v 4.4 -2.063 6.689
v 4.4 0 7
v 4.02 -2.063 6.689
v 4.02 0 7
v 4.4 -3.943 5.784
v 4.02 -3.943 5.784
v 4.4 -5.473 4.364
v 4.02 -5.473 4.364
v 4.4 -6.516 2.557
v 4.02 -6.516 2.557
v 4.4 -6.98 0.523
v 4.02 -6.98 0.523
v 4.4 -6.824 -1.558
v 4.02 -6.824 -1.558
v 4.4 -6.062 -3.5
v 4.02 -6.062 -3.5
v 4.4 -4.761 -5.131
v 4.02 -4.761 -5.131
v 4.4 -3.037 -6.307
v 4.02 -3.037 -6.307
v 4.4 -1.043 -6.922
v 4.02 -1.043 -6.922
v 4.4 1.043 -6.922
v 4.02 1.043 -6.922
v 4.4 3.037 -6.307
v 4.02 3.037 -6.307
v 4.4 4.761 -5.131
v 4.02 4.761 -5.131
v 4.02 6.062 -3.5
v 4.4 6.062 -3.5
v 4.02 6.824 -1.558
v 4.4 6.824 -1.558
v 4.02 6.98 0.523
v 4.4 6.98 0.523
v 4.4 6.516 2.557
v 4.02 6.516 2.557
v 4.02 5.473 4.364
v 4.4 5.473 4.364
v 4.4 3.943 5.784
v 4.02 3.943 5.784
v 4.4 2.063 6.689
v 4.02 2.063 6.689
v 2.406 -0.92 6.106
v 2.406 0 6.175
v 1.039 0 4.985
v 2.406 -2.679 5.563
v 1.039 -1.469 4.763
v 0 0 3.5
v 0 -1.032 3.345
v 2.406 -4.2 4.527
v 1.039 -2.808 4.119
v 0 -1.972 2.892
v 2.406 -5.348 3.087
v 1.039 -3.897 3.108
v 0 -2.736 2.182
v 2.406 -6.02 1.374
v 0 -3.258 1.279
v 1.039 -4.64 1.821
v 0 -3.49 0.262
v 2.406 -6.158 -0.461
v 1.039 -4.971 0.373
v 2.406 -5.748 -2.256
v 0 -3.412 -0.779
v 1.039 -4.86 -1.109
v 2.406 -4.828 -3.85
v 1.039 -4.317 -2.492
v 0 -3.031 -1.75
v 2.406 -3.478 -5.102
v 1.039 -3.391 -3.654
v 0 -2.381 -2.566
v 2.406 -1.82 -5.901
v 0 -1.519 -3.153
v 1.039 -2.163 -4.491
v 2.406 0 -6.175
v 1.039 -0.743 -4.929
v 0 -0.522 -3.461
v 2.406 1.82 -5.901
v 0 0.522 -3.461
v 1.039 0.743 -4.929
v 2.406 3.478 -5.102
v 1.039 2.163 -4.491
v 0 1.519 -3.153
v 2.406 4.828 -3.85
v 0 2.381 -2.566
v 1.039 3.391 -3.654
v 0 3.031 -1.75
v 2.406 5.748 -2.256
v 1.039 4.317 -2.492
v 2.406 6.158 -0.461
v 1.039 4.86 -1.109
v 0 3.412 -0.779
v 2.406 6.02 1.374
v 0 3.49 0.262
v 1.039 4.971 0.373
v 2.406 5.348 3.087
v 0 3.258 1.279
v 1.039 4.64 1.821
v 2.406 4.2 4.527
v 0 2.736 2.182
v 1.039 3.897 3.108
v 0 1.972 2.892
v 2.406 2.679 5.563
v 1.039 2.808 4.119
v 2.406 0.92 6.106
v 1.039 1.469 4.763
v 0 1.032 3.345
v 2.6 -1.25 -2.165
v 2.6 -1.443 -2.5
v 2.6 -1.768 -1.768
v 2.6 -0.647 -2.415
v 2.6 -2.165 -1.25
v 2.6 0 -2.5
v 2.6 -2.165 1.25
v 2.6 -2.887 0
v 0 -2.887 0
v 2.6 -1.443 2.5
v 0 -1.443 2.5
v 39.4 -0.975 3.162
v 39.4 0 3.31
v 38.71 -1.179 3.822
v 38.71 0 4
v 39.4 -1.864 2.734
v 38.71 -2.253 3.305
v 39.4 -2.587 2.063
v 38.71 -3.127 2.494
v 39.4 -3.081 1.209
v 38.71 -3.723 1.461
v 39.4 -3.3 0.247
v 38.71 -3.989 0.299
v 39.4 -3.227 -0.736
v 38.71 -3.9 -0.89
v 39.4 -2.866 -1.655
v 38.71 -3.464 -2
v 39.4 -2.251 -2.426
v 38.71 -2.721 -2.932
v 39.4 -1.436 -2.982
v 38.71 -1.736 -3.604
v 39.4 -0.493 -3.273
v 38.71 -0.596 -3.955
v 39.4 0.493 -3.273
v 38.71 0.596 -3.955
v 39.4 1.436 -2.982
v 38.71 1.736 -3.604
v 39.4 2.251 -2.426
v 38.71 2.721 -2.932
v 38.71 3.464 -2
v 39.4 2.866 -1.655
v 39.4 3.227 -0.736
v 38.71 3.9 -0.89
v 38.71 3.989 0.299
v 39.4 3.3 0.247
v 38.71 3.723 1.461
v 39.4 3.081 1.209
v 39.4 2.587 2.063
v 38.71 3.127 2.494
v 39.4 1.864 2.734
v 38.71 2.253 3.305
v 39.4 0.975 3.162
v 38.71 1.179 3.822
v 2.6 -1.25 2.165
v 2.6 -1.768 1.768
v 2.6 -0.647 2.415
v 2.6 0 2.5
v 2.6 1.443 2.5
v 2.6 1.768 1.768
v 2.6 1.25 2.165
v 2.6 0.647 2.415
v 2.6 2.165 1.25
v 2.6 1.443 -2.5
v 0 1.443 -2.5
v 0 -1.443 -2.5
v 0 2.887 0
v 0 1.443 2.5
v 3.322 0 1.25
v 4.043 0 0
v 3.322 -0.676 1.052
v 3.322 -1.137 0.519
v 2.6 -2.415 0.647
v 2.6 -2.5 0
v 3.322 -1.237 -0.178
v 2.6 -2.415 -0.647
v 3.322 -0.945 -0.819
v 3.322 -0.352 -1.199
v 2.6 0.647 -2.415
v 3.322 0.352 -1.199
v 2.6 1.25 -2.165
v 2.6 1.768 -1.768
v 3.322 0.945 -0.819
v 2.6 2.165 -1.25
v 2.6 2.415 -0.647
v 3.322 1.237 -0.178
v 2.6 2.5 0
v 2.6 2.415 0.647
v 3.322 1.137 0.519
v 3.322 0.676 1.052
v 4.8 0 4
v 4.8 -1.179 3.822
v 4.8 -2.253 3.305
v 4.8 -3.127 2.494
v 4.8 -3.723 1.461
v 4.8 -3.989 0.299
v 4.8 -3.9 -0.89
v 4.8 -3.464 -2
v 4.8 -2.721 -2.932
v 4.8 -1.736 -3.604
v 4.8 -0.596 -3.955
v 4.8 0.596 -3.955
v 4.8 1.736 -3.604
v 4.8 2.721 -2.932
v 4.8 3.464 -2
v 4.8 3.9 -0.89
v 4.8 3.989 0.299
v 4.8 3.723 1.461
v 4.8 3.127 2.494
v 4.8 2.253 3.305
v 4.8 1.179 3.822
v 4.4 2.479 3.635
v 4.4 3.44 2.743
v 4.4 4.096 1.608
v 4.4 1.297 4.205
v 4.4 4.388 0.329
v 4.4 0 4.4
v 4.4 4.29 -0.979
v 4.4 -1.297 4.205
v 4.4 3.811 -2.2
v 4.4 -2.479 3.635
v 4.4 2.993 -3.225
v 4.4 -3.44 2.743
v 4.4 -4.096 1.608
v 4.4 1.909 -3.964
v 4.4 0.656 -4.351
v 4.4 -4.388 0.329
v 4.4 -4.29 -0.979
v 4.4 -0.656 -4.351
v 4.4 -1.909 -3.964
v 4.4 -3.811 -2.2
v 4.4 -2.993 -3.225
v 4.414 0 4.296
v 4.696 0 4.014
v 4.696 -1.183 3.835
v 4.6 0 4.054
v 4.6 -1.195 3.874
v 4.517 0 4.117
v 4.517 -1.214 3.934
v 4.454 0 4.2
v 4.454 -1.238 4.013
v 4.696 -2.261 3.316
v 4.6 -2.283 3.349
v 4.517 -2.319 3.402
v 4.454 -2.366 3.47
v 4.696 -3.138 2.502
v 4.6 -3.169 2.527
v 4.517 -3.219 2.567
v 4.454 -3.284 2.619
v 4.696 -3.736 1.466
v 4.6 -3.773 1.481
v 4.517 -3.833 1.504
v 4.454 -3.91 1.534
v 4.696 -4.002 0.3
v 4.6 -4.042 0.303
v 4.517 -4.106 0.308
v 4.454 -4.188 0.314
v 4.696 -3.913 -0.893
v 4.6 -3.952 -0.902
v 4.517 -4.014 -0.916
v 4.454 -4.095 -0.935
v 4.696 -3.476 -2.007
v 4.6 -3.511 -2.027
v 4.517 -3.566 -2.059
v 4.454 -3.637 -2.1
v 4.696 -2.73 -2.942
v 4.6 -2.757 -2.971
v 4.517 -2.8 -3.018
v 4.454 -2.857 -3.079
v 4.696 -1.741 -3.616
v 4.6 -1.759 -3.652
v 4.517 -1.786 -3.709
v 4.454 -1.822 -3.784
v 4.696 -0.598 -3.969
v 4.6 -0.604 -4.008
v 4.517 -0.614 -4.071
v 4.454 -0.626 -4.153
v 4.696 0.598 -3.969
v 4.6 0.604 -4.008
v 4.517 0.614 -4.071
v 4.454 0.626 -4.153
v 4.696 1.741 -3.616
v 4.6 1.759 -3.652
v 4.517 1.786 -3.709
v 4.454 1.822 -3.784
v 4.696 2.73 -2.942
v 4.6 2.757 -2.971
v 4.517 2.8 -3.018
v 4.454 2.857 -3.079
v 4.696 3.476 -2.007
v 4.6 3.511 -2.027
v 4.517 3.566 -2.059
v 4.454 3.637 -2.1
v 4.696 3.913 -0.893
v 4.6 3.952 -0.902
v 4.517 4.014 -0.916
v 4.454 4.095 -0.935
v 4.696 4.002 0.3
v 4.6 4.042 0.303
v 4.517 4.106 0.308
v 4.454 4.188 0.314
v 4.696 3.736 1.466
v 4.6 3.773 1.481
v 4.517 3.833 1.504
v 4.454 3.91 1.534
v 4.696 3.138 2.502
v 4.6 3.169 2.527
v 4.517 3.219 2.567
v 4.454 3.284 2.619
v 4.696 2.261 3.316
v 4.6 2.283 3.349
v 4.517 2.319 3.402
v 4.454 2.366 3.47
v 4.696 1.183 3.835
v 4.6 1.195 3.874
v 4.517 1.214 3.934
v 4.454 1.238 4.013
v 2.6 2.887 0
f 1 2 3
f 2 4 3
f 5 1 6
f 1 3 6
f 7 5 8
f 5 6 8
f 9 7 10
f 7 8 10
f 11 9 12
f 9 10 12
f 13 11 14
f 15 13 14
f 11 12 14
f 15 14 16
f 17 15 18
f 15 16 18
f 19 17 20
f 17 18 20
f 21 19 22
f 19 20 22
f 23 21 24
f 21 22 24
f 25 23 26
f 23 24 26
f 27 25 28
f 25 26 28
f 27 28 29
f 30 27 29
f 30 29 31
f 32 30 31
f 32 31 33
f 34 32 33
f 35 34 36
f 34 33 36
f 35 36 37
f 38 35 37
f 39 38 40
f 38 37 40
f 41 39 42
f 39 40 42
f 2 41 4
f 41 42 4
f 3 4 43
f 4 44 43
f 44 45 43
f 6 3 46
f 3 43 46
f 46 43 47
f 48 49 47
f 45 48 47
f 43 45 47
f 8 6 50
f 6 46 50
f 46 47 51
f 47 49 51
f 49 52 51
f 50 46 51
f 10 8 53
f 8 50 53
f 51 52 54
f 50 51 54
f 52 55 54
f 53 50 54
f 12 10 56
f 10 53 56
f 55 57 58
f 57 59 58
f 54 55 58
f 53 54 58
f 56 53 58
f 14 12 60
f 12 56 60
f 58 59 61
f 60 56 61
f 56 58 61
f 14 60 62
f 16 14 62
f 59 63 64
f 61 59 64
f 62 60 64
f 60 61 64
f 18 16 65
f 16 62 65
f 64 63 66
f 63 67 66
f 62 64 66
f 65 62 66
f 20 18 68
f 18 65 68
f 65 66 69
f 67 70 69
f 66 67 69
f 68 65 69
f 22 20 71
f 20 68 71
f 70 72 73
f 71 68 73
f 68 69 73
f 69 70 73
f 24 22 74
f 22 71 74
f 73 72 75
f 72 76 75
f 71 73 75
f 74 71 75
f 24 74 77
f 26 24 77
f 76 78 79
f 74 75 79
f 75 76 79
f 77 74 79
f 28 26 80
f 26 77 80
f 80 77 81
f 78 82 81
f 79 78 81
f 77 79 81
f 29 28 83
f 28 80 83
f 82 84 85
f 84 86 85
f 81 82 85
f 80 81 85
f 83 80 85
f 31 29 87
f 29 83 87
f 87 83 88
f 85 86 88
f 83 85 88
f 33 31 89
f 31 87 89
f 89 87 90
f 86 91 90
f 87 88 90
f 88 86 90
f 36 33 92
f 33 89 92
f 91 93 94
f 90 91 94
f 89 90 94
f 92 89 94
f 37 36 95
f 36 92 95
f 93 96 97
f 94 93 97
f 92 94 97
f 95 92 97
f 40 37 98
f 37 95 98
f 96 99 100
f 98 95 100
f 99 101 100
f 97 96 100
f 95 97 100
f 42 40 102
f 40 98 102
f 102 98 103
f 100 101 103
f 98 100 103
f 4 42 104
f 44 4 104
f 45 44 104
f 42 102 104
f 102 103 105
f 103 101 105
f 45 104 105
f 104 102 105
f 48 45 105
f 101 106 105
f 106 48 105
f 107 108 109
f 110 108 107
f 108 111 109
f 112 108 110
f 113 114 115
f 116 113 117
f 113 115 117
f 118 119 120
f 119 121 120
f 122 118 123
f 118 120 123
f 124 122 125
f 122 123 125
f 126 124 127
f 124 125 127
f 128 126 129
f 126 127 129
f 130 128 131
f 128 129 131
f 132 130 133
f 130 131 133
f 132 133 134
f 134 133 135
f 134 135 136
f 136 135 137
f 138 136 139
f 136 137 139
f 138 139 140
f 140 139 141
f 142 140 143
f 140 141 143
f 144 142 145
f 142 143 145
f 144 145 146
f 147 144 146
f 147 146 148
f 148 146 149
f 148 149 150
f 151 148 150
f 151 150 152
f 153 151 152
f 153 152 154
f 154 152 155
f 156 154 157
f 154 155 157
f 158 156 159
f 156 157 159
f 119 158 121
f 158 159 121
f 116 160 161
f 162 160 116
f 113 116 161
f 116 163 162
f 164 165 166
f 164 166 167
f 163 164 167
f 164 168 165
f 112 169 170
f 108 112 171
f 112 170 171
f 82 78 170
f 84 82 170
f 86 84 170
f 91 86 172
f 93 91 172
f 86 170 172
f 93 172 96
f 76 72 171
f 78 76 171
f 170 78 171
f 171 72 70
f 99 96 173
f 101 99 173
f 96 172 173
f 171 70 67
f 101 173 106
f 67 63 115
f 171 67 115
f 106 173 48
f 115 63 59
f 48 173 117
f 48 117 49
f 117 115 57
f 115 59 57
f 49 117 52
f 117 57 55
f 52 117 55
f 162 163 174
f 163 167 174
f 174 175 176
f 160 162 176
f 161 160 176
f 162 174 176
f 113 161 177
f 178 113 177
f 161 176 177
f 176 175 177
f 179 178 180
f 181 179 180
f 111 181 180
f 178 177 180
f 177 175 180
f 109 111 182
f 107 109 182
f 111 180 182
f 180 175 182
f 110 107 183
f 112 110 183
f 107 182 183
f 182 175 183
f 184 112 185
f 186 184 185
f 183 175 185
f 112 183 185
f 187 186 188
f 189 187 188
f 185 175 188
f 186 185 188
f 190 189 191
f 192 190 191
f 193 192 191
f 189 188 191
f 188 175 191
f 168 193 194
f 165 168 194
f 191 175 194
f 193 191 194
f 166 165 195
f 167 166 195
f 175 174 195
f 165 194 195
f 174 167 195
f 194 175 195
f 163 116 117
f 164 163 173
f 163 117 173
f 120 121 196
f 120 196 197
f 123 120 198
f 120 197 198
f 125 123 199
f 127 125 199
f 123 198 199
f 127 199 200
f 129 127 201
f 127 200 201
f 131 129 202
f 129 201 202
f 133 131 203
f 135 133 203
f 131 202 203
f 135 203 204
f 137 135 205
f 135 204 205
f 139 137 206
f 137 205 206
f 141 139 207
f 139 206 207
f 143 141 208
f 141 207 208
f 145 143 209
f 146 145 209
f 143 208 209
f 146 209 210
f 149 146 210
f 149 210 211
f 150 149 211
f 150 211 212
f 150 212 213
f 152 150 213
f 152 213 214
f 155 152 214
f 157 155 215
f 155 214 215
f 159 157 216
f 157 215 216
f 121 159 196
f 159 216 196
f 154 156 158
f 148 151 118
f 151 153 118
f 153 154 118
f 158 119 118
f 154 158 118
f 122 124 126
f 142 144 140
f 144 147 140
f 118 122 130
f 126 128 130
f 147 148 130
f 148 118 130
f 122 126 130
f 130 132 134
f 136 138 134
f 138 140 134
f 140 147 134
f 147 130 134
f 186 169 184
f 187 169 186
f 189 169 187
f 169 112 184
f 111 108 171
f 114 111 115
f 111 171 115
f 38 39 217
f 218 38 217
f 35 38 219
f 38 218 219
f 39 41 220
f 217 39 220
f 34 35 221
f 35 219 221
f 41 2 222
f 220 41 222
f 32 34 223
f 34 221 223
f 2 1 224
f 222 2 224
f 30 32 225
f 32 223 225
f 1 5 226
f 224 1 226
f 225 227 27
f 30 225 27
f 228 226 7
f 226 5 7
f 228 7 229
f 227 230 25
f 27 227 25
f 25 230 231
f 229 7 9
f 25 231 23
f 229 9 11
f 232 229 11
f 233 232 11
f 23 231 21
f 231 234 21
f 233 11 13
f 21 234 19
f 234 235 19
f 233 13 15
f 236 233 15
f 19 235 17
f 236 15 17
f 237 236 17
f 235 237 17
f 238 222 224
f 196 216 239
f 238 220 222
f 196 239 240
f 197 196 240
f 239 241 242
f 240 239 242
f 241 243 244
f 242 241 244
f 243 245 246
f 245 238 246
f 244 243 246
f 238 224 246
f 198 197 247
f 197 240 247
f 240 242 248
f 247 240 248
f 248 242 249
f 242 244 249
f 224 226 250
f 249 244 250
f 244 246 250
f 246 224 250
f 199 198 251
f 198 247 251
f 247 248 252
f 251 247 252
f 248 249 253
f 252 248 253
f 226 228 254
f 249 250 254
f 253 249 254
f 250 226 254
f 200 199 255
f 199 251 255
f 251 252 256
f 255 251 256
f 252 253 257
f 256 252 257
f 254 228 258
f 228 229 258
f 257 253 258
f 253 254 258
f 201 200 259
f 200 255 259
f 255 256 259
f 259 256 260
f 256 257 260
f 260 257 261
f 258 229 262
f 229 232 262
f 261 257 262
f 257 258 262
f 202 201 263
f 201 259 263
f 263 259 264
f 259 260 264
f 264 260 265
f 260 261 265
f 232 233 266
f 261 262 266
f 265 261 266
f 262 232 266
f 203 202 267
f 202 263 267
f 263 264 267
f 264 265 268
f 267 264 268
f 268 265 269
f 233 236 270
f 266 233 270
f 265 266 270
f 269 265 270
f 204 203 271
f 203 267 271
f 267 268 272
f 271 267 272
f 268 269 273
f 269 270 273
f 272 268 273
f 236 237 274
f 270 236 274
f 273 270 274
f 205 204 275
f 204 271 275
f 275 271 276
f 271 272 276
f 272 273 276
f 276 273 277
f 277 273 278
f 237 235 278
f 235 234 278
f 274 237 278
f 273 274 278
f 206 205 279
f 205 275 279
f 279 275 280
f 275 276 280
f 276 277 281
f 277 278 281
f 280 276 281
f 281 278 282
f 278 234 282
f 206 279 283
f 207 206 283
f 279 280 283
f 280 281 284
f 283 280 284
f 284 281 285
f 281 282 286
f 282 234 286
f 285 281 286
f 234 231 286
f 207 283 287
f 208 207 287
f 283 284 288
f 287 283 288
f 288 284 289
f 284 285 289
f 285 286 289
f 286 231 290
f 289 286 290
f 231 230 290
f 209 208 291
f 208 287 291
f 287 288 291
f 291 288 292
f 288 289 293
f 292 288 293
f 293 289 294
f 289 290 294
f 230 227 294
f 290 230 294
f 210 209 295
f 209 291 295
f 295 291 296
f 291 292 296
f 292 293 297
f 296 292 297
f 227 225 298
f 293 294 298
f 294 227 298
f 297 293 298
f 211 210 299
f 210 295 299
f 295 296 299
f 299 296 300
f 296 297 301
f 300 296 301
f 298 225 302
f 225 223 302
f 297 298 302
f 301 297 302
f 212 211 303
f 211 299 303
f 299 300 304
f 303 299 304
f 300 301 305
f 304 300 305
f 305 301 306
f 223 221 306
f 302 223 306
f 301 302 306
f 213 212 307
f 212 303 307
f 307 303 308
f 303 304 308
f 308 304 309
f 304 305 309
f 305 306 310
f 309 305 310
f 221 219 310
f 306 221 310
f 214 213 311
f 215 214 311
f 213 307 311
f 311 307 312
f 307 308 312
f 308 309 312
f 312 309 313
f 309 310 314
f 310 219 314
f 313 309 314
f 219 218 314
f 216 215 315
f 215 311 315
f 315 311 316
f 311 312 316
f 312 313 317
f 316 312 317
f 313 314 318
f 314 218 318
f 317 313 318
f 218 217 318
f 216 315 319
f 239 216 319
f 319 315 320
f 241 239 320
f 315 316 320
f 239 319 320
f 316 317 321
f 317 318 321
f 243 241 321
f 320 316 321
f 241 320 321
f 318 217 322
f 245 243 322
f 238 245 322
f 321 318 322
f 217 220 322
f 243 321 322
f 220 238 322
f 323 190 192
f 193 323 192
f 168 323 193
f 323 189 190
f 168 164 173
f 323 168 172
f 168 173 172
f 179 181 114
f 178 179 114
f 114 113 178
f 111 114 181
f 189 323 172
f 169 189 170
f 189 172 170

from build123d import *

# Parameters (mm, degrees)
FILLET1_R   = 0.4
HEX_2_DEPTH = 2.6


with BuildPart() as part:
    # BodySke → BaseBody (revolve)
    with BuildSketch(Plane.XY, mode=Mode.PRIVATE) as basebody_sk:
        with BuildLine():
            Line((39.4, 0), (39.4, 3.3095))
            Line((39.4, 3.3095), (38.7095, 4))
            Line((38.7095, 4), (4.4, 4))
            Line((4.4, 4), (4.4, 7))
            Line((4.4, 7), (4.02, 7))
            ThreePointArc((4.02, 7), (1.686451133, 5.621618984), (0, 3.5))
            Line((0, 3.5), (0, 0))
            Line((0, 0), (39.4, 0))
        make_face()
    revolve(basebody_sk.sketch.rotate(Axis((0, 0, 0), (1, 0, 0)), 90), axis=Axis((0, 0, 0), (1, 0, 0)))

    # Fillet1
    fillet1_edges = [part.edges().sort_by_distance(p)[0] for p in [
        (4.4, 0, -4),
    ]]
    fillet(fillet1_edges, radius=FILLET1_R)

    # Sketch2 → PreBroach (revolve, cut)
    with BuildSketch(Plane.XY, mode=Mode.PRIVATE) as prebroach_sk:
        Polygon((0, 2.5), (2.6, 2.5), (4.043375673, 0), (0, 0), align=None)
    revolve(prebroach_sk.sketch.rotate(Axis((0, 0, 0), (1, 0, 0)), 90), axis=Axis((0, 0, 0), (1, 0, 0)), mode=Mode.SUBTRACT)

    # Sketch3 → Hex 2 (cut)
    with BuildSketch(Plane(origin=(0, 0, 0), x_dir=(0, 0, -1), z_dir=(1, 0, 0))):
        Polygon((-2.5, -1.443375673), (-2.5, 1.443375673), (0, 2.886751346), (2.5, 1.443375673), (2.5, -1.443375673), (0, -2.886751346), align=None)
    extrude(amount=HEX_2_DEPTH, mode=Mode.SUBTRACT)


solid = part.part
